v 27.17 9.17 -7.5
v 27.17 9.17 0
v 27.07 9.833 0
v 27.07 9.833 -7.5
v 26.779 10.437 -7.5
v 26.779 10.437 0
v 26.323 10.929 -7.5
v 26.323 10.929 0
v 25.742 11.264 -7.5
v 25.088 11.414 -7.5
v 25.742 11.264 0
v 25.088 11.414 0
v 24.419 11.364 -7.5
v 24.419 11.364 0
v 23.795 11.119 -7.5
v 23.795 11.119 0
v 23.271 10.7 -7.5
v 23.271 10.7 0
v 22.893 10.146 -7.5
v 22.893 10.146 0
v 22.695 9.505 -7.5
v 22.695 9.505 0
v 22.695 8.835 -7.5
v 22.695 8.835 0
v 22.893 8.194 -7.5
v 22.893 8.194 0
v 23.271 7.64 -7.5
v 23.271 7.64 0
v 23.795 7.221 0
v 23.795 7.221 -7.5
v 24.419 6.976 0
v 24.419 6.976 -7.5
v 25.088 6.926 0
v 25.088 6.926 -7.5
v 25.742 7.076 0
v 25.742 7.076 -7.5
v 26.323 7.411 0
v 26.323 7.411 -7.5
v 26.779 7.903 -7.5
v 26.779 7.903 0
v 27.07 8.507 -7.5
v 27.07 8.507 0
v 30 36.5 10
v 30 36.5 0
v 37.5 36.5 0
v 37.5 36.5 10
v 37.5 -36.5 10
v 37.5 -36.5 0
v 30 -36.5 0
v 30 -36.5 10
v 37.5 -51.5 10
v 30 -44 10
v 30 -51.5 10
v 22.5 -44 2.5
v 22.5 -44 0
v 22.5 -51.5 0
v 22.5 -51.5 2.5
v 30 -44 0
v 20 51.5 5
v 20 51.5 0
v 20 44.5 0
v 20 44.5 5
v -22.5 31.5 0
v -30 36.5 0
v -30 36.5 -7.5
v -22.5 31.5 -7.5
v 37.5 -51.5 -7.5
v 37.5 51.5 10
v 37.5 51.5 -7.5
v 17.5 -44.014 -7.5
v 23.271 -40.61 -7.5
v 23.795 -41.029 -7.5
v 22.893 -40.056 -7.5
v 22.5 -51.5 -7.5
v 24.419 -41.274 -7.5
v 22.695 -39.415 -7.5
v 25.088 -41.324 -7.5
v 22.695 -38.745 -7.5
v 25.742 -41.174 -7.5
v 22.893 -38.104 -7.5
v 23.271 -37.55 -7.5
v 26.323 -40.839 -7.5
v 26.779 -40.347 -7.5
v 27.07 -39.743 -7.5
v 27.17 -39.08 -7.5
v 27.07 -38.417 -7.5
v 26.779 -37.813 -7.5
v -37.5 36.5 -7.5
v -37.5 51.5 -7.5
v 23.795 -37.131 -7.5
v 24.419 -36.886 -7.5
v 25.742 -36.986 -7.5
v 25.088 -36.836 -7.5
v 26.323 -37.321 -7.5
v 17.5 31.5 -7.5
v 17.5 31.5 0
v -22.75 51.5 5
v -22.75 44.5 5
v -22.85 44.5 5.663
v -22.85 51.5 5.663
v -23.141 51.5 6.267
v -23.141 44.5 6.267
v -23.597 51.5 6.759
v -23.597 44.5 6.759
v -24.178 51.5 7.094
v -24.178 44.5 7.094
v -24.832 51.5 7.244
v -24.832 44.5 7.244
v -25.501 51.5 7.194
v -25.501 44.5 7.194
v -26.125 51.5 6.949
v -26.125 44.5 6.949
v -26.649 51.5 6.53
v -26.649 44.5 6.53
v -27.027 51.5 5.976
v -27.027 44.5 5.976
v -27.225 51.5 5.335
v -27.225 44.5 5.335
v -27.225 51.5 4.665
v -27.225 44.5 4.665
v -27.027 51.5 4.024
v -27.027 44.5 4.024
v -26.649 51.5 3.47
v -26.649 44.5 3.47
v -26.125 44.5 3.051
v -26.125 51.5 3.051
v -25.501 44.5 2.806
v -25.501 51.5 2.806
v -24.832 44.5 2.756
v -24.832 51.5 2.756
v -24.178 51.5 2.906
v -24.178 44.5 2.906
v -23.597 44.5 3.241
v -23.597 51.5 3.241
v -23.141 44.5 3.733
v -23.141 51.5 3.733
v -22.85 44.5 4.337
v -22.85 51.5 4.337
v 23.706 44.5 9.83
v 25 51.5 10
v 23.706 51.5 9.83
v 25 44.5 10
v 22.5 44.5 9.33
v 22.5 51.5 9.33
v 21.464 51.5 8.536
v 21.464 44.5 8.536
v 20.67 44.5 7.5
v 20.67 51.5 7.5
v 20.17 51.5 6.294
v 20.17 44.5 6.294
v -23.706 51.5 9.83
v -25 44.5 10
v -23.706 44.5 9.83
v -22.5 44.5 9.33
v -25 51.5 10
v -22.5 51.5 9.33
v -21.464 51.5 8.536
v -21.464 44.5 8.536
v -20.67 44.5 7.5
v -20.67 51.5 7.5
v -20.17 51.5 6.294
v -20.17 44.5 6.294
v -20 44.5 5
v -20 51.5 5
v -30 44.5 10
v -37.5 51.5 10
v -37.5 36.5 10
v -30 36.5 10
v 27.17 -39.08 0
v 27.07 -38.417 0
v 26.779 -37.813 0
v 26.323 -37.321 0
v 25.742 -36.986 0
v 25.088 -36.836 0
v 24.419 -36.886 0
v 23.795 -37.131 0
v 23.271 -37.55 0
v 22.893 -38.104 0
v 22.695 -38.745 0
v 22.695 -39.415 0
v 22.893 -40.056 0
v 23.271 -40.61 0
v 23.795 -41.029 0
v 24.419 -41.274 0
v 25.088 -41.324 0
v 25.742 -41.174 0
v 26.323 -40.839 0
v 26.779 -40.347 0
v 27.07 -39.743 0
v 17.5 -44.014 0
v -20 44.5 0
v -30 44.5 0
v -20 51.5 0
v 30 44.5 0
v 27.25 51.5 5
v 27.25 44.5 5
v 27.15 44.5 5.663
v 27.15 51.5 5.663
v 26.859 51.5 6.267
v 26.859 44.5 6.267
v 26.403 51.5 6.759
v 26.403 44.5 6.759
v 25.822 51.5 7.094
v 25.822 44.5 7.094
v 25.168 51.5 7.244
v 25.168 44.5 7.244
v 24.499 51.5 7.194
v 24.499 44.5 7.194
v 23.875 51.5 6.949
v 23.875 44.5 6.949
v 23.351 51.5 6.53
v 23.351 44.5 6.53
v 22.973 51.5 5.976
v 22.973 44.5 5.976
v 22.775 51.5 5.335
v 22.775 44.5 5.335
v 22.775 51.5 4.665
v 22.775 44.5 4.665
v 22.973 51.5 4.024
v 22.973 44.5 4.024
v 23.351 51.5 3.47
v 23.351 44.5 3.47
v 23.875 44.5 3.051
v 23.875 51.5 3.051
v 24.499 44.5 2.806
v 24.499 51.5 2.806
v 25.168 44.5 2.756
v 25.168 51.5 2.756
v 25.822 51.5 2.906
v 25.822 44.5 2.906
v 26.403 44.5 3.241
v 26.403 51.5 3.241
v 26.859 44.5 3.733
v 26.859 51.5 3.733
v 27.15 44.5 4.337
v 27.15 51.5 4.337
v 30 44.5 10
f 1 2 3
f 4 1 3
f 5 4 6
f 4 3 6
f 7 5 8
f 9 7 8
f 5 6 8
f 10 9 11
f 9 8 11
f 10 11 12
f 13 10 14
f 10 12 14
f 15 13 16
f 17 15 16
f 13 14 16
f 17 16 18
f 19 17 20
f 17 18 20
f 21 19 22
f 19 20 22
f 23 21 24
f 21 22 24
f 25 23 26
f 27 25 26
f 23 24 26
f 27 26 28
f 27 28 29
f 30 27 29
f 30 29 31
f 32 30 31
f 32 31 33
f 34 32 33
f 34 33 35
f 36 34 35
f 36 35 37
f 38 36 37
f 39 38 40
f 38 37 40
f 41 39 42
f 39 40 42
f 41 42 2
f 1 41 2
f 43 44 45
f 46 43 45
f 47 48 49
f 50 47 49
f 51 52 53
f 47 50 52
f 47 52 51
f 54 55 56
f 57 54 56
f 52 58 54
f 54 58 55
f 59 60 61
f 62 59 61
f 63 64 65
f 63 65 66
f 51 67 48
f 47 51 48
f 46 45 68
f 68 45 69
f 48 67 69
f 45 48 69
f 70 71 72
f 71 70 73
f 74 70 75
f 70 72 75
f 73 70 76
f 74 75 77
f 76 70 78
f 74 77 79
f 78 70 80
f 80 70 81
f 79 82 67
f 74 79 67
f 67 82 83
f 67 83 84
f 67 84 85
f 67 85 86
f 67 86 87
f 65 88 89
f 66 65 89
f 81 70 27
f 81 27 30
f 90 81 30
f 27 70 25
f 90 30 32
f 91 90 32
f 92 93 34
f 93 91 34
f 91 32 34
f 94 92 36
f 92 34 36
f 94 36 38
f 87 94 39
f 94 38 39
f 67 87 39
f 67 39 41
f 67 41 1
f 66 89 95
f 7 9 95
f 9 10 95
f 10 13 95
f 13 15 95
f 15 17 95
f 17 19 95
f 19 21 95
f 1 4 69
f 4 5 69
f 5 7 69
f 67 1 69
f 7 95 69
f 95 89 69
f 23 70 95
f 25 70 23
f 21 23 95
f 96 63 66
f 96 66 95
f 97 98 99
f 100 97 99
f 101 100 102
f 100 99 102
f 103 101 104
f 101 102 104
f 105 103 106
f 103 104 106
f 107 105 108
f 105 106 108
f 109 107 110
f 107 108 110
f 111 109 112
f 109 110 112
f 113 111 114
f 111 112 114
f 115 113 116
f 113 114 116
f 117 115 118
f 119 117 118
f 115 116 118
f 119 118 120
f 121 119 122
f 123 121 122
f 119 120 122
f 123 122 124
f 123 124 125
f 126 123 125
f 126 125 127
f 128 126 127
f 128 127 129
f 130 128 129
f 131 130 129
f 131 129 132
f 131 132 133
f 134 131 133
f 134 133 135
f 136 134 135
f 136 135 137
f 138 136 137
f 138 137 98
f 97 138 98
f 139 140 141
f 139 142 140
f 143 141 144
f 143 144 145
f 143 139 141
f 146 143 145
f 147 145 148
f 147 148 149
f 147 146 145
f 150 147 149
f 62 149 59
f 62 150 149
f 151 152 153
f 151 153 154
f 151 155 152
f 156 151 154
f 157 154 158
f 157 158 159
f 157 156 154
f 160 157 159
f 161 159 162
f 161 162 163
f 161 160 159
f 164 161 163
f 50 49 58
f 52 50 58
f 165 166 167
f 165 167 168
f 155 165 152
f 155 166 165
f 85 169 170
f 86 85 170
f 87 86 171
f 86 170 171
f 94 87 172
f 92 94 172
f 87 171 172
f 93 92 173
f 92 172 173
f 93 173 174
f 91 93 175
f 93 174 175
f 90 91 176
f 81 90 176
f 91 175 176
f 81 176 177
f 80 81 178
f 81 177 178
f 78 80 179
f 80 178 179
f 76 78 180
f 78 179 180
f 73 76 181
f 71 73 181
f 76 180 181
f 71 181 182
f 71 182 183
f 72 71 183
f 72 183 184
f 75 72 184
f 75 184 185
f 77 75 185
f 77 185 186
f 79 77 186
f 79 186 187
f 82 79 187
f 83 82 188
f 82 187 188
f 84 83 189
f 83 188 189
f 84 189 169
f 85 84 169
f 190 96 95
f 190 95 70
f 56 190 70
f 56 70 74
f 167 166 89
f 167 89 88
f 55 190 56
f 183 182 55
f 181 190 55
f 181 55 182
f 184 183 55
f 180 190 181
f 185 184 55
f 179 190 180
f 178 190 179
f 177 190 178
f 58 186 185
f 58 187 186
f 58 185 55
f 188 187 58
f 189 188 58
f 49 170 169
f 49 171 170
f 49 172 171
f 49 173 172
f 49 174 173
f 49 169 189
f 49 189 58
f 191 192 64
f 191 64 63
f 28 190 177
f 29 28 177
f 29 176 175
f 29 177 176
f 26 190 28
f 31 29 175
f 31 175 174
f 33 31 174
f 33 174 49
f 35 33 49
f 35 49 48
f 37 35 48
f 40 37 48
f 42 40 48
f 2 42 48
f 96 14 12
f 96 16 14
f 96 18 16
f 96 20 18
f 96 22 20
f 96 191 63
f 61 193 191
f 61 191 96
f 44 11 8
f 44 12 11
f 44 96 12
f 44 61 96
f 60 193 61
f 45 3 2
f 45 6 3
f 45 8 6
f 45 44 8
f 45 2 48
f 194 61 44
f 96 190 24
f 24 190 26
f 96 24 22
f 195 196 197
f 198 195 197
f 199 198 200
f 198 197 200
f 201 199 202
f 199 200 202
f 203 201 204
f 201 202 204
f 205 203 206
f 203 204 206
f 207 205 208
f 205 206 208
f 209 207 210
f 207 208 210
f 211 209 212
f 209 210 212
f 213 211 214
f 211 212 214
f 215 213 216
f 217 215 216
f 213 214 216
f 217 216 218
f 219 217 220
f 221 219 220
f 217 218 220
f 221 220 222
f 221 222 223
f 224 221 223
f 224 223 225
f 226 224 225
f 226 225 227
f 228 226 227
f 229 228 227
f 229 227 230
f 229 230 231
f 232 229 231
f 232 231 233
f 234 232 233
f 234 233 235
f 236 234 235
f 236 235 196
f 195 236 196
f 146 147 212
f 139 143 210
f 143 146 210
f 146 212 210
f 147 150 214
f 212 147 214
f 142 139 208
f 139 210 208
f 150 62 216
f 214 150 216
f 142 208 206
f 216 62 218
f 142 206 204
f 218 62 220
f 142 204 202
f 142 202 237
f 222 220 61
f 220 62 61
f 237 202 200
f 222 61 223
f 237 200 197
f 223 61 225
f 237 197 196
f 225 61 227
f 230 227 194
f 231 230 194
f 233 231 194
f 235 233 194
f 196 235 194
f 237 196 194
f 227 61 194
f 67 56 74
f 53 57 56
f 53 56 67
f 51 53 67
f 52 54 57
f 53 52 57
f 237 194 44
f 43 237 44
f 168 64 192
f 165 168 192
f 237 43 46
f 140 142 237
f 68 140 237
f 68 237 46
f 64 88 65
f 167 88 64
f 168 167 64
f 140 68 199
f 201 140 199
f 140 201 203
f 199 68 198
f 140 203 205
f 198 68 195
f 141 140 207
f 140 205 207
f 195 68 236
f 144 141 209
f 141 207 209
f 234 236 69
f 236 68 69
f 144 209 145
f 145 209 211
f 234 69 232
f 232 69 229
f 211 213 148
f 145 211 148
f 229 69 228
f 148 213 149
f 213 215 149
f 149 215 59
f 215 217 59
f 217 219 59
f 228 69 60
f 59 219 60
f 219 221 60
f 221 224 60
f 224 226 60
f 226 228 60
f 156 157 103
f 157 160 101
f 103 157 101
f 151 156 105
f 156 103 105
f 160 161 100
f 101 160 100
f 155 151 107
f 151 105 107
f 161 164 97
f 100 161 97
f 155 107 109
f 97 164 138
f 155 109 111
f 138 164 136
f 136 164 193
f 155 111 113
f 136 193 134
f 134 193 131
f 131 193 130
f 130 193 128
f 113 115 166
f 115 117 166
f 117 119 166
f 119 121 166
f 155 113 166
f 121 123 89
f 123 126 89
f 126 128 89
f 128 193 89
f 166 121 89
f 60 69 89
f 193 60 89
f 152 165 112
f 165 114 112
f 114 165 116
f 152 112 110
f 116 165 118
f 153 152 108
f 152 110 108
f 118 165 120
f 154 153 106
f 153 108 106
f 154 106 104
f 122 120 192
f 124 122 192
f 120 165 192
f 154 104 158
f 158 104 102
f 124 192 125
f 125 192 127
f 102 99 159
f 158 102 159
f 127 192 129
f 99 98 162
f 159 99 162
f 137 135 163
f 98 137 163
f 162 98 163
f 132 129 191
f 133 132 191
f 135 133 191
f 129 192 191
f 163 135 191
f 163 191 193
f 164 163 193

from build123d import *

# Parameters (mm, degrees)
F0_W     = 7.5
F0_H     = 73
F0_R     = 2.25
F1_DEPTH = 7.5
F2_DEPTH = 10
F3_R     = 2.25
F4_DEPTH = 75
F5_SIZE  = 7.5
F6_R     = 5


with BuildPart() as f1:
    # F0 (on Top) → F1 (new body)
    with BuildSketch(Plane.XY):
        with Locations((33.75, 0)):
            Rectangle(F0_W, F0_H)
        Polygon((37.5, -51.5), (37.5, -36.5), (30, -36.5), (30, -44), (22.5, -44), (22.5, -51.5), align=None)
        Polygon((30, 44.5), (20, 44.5), (17.5, 44.5), (17.5, 31.5), (17.5, -44.014243), (22.5, -51.5), (22.5, -44), (30, -44), (30, -36.5), (30, 36.5), align=None)
        with Locations((24.92, -39.08)):
            Circle(F0_R, mode=Mode.SUBTRACT)
        with Locations((24.92, 9.17)):
            Circle(F0_R, mode=Mode.SUBTRACT)
        Polygon((37.5, 51.5), (20, 51.5), (20, 44.5), (30, 44.5), (30, 36.5), (37.5, 36.5), align=None)
        Polygon((20, 51.5), (-20, 51.5), (-20, 44.5), (17.5, 44.5), (20, 44.5), align=None)
        Polygon((-20, 51.5), (-37.5, 51.5), (-37.5, 36.5), (-30, 36.5), (-30, 44.5), (-20, 44.5), align=None)
        Polygon((17.5, 44.5), (-20, 44.5), (-30, 44.5), (-30, 36.5), (-22.5, 31.5), (17.5, 31.5), align=None)
    extrude(amount=-F1_DEPTH)

    # F0 (on Top) → F2 (join)
    with BuildSketch(Plane.XY):
        Polygon((37.5, 51.5), (20, 51.5), (20, 44.5), (30, 44.5), (30, 36.5), (37.5, 36.5), align=None)
        Polygon((37.5, -51.5), (37.5, -36.5), (30, -36.5), (30, -44), (22.5, -44), (22.5, -51.5), align=None)
        Polygon((-20, 51.5), (-37.5, 51.5), (-37.5, 36.5), (-30, 36.5), (-30, 44.5), (-20, 44.5), align=None)
    extrude(amount=F2_DEPTH)

    # F3 (on Front) → F4 (cut)
    with BuildSketch(Plane.XZ):
        with Locations((25, 5)):
            Circle(F3_R)
        with Locations((-25, 5)):
            Circle(F3_R)
    extrude(amount=-F4_DEPTH, mode=Mode.SUBTRACT)

    # F5
    f5_edges = [f1.edges().sort_by_distance(p)[0] for p in [
        (22.5, -47.75, 10),
    ]]
    chamfer(f5_edges, length=F5_SIZE)

    # F6
    f6_edges = [f1.edges().sort_by_distance(p)[0] for p in [
        (-20, 48, 10),
        (20, 48, 10),
    ]]
    fillet(f6_edges, radius=F6_R)


solid = f1.part
